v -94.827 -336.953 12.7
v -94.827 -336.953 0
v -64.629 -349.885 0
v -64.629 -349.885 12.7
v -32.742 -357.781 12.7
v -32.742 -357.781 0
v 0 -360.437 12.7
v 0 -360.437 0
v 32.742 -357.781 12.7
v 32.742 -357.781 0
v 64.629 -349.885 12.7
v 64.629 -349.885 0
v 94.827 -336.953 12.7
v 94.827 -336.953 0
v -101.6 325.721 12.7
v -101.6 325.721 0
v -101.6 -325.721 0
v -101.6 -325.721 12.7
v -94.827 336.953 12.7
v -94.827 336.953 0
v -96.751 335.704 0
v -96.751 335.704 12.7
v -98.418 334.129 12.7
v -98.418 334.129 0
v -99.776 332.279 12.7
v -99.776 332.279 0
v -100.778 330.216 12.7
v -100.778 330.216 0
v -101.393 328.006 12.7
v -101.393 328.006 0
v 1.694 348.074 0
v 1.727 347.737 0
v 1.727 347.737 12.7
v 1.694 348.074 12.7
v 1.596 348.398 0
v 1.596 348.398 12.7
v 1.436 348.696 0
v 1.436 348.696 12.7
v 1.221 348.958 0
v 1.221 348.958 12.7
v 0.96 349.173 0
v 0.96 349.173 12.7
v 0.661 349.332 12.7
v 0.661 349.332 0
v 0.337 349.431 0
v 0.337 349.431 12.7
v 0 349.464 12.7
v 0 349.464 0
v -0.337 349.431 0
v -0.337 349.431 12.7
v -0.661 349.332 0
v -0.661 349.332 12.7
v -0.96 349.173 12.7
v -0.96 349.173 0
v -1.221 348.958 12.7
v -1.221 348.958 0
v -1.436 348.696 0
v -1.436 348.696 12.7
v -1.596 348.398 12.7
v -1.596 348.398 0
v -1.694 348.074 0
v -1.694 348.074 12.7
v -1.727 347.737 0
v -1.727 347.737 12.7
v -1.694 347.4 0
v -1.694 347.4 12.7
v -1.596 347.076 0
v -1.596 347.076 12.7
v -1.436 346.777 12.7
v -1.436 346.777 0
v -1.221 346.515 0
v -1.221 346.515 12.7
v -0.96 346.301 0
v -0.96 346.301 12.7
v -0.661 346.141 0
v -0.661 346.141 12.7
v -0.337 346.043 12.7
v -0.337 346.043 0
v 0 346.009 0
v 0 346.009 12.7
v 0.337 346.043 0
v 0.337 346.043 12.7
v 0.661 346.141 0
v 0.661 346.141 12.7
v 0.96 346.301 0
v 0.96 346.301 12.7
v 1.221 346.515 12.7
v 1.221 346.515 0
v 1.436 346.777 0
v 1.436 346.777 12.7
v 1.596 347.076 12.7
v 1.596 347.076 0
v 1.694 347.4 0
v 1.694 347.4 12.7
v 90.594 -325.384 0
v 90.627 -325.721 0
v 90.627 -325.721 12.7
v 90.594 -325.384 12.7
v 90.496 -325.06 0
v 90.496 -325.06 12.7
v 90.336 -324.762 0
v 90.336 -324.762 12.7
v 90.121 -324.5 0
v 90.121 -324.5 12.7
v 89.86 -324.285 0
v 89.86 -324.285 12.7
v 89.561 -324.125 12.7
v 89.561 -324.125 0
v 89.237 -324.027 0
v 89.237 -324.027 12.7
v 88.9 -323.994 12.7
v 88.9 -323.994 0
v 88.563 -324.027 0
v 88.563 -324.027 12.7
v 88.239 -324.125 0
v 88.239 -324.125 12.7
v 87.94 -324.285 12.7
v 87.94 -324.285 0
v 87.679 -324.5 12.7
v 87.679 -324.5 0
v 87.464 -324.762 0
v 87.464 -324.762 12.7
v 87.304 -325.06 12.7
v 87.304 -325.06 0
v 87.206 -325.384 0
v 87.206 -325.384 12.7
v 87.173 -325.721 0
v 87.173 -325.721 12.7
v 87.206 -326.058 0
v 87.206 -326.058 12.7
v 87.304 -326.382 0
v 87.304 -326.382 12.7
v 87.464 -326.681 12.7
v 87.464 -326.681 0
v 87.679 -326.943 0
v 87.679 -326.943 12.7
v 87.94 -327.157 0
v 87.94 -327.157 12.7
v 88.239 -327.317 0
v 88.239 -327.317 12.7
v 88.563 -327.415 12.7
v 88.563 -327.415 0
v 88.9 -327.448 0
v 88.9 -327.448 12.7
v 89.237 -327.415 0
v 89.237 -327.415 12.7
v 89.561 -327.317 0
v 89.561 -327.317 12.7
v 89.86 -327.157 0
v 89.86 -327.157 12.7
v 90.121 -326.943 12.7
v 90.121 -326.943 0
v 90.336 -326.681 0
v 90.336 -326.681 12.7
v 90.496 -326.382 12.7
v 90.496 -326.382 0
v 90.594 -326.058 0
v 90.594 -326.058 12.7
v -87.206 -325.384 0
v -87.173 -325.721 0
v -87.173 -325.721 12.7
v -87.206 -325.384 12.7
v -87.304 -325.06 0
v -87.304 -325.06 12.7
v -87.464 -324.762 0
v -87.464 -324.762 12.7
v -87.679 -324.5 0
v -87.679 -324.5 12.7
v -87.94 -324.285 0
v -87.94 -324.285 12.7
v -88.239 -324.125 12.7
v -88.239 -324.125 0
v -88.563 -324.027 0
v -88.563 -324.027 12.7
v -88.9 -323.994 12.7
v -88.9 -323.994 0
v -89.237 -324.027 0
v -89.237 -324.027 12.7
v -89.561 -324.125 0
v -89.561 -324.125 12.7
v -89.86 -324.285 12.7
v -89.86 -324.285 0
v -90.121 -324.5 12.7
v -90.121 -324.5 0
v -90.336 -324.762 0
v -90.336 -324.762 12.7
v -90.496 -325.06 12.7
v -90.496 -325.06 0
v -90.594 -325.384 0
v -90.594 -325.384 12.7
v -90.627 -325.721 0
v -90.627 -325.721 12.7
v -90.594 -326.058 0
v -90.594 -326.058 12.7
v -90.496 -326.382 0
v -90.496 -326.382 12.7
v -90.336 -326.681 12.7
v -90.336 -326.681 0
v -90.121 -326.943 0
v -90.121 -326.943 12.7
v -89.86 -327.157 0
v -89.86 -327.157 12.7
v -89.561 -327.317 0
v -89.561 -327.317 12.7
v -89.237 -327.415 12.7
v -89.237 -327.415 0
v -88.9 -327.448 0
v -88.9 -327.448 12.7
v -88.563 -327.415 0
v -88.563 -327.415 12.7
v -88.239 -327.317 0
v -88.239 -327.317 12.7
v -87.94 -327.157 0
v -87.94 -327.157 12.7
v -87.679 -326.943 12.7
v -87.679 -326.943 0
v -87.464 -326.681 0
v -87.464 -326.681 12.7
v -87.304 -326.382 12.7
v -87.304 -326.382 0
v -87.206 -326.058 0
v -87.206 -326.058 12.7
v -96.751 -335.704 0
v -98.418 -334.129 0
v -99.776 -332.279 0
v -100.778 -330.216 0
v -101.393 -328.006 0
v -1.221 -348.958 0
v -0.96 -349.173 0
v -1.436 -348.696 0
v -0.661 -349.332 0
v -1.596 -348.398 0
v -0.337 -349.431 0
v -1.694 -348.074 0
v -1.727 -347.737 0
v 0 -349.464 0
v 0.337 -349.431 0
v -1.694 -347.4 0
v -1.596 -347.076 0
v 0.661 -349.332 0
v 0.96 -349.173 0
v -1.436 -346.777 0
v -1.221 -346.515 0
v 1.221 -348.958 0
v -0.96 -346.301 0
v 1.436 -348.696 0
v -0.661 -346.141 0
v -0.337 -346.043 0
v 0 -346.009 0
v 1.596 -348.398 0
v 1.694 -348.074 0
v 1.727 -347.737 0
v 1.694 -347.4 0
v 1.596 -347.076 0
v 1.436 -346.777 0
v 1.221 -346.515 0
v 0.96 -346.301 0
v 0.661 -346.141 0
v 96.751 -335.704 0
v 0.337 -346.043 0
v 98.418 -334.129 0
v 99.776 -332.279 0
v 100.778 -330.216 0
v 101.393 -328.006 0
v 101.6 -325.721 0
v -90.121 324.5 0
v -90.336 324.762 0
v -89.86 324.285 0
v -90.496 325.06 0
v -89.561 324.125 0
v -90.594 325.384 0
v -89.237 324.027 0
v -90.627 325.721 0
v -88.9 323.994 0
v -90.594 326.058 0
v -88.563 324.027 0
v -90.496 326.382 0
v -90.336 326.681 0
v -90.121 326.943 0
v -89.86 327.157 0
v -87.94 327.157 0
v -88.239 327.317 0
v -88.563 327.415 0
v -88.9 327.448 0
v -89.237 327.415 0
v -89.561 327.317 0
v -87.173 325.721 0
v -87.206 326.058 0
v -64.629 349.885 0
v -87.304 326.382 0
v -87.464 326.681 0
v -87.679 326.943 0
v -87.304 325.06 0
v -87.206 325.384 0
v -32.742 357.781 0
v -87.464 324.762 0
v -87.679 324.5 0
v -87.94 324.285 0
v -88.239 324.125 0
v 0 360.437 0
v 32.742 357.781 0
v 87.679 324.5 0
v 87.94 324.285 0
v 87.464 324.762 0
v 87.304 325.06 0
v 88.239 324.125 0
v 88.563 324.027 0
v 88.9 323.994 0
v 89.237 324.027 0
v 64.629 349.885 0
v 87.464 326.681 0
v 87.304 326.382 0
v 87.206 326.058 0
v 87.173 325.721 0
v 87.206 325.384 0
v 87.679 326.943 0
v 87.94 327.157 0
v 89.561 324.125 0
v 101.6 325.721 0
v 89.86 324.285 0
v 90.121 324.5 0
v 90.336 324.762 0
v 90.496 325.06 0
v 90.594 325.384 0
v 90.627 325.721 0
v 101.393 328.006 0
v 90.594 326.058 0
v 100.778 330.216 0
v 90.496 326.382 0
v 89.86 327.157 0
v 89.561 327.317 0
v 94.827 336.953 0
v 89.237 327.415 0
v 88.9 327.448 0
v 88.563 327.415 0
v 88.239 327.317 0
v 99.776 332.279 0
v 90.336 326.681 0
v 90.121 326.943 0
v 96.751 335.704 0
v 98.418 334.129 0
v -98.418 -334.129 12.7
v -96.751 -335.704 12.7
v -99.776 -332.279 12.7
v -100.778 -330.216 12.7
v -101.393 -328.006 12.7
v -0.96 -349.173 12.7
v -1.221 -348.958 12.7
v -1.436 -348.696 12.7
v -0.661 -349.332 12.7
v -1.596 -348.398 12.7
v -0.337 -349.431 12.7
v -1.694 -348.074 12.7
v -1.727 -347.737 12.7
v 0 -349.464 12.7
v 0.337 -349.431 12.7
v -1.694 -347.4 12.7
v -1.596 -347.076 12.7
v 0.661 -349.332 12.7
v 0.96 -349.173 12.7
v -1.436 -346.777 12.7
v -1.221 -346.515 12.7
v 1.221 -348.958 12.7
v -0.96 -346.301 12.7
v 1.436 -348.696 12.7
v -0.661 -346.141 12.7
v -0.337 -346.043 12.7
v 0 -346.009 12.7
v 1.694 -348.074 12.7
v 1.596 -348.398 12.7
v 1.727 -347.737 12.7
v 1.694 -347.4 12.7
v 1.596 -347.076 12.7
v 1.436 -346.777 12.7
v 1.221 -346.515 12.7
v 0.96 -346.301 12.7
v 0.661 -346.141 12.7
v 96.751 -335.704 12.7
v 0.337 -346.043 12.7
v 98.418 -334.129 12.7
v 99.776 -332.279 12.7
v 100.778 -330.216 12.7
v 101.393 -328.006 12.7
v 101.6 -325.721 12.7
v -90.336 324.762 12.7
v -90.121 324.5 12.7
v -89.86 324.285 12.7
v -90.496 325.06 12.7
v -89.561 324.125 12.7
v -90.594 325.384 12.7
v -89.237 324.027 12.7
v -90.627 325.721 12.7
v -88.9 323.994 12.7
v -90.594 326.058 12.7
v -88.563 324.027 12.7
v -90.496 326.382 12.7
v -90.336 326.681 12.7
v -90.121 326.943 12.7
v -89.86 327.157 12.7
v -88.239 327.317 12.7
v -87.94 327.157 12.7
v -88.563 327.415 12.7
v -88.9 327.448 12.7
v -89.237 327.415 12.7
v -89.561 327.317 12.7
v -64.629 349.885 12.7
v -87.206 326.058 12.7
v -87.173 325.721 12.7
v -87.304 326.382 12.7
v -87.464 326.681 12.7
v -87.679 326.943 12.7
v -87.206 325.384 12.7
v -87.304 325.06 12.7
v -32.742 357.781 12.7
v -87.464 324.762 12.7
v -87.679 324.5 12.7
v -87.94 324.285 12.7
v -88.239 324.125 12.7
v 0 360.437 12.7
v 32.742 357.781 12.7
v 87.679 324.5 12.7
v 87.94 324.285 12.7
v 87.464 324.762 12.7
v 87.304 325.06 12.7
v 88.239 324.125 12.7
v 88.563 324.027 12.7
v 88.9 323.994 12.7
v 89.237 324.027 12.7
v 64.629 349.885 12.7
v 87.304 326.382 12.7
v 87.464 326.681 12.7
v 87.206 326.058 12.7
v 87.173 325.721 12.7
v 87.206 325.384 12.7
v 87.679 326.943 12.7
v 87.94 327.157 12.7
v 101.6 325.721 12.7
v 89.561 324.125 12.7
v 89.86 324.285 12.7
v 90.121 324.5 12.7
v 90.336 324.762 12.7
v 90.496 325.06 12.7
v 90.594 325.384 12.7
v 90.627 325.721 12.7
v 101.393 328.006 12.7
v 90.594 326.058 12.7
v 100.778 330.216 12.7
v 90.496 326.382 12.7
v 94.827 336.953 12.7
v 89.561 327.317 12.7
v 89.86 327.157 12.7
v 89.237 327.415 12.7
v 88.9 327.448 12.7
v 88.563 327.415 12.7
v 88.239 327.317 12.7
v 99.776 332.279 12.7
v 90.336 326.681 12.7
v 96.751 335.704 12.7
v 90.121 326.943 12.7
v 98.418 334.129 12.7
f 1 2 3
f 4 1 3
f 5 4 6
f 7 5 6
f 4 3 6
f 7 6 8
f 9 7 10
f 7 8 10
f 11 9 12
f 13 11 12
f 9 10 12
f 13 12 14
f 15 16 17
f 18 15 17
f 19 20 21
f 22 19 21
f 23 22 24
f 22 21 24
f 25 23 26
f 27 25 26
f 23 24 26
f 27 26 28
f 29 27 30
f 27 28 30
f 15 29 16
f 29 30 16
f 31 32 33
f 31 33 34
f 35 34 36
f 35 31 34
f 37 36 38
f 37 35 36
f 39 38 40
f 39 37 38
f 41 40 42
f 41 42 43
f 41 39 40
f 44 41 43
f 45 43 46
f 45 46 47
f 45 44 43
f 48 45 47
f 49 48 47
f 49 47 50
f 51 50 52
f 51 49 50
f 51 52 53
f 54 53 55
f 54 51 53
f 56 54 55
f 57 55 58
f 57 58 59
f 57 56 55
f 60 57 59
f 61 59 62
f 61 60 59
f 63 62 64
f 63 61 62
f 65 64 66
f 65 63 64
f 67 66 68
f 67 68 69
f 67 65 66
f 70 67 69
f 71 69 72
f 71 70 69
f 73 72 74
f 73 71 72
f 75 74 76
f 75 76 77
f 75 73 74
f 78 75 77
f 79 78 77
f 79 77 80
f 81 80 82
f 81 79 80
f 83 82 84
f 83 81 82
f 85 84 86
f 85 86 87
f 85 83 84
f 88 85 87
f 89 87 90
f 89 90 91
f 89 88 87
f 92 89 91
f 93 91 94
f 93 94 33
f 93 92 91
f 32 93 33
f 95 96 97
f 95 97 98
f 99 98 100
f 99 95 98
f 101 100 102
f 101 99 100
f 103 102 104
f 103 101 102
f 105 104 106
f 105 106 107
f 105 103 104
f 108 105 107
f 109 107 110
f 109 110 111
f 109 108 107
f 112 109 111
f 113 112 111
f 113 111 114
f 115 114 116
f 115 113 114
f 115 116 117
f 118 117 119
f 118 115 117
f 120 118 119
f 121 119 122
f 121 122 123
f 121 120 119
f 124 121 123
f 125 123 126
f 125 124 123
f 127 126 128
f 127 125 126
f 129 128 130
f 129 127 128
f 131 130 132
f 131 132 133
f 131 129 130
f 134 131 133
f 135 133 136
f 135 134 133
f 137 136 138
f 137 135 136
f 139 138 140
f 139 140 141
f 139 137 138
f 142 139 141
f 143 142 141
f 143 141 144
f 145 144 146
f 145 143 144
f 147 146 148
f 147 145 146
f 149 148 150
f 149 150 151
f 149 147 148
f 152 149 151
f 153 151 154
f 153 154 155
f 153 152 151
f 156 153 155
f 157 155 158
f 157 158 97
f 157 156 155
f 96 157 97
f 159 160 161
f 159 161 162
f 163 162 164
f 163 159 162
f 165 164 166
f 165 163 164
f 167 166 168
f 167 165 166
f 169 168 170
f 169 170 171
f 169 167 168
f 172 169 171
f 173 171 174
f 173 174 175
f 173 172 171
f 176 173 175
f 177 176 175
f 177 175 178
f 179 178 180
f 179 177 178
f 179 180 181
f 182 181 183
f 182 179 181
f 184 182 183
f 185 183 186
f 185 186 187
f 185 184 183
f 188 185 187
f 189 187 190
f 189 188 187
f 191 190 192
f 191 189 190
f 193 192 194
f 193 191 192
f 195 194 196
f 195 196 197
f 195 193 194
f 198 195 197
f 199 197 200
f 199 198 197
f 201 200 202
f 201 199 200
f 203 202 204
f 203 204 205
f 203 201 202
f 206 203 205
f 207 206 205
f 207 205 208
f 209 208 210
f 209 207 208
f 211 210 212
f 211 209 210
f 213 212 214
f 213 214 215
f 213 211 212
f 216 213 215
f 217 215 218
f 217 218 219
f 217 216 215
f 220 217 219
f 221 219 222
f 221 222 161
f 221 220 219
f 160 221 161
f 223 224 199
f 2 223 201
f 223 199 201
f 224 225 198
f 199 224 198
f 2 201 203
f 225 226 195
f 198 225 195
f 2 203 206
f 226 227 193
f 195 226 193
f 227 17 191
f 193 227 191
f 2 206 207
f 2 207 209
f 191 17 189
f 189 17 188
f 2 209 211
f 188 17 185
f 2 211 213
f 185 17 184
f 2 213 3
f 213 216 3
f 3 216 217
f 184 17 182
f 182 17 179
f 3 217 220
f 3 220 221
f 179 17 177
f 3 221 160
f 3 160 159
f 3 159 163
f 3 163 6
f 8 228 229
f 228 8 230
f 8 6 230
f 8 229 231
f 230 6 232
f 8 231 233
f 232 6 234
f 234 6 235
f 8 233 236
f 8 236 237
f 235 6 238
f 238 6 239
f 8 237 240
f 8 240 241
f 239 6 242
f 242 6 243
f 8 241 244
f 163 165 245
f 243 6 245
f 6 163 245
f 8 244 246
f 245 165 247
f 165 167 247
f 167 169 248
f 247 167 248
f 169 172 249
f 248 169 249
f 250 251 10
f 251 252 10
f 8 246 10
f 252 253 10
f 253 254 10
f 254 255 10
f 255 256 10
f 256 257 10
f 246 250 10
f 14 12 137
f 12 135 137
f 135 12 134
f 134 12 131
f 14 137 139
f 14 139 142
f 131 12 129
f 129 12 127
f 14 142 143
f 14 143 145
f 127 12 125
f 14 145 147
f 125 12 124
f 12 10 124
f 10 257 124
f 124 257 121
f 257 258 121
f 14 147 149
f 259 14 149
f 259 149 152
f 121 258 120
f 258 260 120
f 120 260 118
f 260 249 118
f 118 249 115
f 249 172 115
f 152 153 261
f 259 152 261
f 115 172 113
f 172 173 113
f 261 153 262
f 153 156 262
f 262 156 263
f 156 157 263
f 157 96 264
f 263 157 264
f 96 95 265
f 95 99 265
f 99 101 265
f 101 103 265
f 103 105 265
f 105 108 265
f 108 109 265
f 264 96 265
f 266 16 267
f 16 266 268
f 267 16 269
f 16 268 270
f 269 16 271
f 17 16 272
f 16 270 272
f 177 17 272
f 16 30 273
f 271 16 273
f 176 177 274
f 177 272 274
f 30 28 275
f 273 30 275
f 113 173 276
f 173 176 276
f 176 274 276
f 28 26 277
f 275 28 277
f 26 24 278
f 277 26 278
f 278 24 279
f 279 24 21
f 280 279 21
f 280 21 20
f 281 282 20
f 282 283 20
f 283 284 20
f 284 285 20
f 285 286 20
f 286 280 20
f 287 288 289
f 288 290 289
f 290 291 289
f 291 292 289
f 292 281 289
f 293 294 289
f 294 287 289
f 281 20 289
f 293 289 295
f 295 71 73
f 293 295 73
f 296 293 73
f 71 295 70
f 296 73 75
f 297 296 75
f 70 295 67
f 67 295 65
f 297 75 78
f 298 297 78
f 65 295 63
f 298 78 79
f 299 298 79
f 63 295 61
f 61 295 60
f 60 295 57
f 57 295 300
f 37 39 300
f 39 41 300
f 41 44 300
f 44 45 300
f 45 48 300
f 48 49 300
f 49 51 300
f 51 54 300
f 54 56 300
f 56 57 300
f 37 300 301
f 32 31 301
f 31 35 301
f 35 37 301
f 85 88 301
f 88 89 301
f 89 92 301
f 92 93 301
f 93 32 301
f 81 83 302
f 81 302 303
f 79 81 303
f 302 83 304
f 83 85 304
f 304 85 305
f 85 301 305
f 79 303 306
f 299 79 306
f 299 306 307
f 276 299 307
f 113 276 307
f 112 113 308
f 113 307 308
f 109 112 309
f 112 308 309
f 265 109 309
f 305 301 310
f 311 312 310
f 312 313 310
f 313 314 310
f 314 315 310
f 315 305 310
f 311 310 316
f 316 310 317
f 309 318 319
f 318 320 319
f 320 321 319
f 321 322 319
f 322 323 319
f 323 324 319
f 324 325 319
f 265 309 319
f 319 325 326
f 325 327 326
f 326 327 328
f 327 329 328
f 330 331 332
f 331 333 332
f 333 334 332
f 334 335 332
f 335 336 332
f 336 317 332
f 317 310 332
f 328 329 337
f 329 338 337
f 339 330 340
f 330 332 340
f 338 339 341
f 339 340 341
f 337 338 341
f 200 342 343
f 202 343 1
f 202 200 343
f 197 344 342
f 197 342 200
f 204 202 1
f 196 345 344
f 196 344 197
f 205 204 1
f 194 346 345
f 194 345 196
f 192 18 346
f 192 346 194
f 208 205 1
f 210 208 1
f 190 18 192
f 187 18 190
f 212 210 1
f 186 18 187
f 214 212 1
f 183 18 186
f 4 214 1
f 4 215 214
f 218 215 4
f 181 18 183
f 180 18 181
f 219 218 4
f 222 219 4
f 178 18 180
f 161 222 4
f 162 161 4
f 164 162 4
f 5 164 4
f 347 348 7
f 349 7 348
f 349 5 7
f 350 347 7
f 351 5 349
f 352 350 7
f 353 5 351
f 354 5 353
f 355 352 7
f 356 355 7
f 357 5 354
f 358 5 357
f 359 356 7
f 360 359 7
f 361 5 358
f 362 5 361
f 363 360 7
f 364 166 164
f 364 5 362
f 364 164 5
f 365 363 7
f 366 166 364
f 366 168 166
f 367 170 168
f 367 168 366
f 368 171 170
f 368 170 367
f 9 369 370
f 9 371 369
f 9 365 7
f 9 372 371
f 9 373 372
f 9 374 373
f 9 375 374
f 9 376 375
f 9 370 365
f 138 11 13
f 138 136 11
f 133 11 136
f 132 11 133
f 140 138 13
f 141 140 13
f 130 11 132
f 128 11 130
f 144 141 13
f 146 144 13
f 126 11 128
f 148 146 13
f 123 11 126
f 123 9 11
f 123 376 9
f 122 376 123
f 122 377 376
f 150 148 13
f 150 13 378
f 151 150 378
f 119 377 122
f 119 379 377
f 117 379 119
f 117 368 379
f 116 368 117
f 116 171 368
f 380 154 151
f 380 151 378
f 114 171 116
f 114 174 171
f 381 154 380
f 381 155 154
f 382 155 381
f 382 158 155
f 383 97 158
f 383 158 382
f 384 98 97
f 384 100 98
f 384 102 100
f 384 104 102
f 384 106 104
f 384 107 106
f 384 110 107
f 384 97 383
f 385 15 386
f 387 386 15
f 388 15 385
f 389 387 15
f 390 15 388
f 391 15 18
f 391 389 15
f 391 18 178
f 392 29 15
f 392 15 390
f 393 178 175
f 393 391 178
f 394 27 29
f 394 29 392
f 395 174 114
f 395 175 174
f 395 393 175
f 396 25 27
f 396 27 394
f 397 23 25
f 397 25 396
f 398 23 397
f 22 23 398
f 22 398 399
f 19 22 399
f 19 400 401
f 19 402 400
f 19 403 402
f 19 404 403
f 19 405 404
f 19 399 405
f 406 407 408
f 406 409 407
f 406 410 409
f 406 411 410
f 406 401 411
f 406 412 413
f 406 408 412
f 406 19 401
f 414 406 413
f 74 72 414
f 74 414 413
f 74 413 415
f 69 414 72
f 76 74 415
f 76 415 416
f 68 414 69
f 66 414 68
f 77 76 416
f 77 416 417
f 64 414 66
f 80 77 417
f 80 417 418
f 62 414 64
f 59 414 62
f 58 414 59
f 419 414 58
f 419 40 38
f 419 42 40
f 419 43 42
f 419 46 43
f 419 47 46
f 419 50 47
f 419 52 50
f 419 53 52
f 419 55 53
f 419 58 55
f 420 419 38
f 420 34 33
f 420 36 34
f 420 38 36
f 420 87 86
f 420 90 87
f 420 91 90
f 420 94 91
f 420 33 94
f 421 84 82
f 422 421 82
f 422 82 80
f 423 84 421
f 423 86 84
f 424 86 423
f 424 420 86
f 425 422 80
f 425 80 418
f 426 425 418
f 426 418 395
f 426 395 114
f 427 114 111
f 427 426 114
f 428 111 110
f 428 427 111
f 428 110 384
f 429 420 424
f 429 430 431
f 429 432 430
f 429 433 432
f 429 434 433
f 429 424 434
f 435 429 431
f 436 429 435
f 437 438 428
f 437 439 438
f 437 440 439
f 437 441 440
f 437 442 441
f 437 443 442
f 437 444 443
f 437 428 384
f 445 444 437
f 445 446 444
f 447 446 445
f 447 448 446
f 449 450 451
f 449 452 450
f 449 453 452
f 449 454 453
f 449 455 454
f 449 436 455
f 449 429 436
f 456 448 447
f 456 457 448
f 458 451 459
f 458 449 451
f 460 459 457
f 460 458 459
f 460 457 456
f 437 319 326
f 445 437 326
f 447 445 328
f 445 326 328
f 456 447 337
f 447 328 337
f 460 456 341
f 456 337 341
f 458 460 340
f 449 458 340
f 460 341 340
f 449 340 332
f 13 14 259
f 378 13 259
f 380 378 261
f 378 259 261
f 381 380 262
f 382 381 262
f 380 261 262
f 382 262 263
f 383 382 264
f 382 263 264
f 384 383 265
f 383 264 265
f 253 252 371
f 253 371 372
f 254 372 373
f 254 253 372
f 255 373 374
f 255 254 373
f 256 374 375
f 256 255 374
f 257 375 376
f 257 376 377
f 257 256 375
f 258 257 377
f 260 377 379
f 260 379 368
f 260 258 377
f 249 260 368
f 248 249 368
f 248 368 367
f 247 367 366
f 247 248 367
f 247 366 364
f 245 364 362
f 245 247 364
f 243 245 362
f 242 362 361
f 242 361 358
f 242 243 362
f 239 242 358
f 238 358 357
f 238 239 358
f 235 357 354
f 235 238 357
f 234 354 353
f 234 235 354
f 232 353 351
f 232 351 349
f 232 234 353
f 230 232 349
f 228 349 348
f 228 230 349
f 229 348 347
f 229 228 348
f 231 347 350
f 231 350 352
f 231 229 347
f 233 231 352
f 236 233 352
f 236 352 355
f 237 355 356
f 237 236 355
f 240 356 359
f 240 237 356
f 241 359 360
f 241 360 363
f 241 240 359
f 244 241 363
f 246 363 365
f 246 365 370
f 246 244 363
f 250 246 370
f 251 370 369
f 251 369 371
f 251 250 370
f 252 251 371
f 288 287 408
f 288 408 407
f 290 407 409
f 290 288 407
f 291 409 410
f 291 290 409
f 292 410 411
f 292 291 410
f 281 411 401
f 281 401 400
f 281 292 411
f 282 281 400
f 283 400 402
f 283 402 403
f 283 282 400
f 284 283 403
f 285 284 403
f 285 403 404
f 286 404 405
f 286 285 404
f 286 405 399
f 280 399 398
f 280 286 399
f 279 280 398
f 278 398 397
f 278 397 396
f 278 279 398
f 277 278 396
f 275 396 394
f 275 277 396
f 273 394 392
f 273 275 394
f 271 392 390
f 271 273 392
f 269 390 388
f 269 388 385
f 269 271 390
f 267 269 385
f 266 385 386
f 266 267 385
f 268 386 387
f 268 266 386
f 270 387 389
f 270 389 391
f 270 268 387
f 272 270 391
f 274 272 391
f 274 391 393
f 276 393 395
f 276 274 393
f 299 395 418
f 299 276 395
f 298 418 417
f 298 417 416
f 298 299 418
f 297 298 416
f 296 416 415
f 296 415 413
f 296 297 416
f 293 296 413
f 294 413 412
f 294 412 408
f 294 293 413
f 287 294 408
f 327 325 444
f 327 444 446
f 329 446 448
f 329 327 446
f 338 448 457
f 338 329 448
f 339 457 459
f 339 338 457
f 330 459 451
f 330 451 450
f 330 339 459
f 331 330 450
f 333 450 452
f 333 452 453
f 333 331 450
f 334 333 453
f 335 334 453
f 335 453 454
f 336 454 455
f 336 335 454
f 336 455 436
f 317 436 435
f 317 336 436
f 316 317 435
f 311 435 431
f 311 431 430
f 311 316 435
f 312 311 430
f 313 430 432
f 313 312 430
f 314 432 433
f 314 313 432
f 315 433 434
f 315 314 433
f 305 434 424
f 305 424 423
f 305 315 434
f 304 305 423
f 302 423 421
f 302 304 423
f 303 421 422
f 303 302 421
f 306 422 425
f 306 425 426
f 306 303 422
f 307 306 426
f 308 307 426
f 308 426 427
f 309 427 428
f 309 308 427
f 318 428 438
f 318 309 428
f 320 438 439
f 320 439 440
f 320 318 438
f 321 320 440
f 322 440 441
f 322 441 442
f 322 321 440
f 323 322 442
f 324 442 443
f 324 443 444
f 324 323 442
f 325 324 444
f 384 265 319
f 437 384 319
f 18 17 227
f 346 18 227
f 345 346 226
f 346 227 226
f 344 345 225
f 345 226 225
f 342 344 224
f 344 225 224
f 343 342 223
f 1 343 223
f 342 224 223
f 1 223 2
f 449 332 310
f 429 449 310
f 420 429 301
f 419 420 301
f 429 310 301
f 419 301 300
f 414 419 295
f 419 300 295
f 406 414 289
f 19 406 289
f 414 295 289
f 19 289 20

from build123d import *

# Parameters (mm, degrees)
F0_R     = 1.7272
F1_DEPTH = 12.7


with BuildPart() as f1:
    # F0 (on Top) → F1 (new body)
    with BuildSketch(Plane.XY):
        with BuildLine():
            Line((101.6, -325.721193), (101.6, 325.721193))
            ThreePointArc((101.6, 325.721193), (99.77563, 332.279444), (94.826667, 336.953495))
            ThreePointArc((94.826667, 336.953495), (0, 360.436653), (-94.826667, 336.953495))
            ThreePointArc((-94.826667, 336.953495), (-99.77563, 332.279444), (-101.6, 325.721193))
            Line((-101.6, 325.721193), (-101.6, -325.721193))
            ThreePointArc((-101.6, -325.721193), (-99.77563, -332.279444), (-94.826667, -336.953495))
            ThreePointArc((-94.826667, -336.953495), (0, -360.436653), (94.826667, -336.953495))
            ThreePointArc((94.826667, -336.953495), (99.77563, -332.279444), (101.6, -325.721193))
        make_face()
        with Locations((-88.9, -325.721193)):
            Circle(F0_R, mode=Mode.SUBTRACT)
        with Locations((0, -347.736653)):
            Circle(F0_R, mode=Mode.SUBTRACT)
        with Locations((88.9, -325.721193)):
            Circle(F0_R, mode=Mode.SUBTRACT)
        with Locations((-88.9, 325.721193)):
            Circle(F0_R, mode=Mode.SUBTRACT)
        with Locations((0, 347.736653)):
            Circle(F0_R, mode=Mode.SUBTRACT)
        with Locations((88.9, 325.721193)):
            Circle(F0_R, mode=Mode.SUBTRACT)
    extrude(amount=F1_DEPTH)


solid = f1.part
